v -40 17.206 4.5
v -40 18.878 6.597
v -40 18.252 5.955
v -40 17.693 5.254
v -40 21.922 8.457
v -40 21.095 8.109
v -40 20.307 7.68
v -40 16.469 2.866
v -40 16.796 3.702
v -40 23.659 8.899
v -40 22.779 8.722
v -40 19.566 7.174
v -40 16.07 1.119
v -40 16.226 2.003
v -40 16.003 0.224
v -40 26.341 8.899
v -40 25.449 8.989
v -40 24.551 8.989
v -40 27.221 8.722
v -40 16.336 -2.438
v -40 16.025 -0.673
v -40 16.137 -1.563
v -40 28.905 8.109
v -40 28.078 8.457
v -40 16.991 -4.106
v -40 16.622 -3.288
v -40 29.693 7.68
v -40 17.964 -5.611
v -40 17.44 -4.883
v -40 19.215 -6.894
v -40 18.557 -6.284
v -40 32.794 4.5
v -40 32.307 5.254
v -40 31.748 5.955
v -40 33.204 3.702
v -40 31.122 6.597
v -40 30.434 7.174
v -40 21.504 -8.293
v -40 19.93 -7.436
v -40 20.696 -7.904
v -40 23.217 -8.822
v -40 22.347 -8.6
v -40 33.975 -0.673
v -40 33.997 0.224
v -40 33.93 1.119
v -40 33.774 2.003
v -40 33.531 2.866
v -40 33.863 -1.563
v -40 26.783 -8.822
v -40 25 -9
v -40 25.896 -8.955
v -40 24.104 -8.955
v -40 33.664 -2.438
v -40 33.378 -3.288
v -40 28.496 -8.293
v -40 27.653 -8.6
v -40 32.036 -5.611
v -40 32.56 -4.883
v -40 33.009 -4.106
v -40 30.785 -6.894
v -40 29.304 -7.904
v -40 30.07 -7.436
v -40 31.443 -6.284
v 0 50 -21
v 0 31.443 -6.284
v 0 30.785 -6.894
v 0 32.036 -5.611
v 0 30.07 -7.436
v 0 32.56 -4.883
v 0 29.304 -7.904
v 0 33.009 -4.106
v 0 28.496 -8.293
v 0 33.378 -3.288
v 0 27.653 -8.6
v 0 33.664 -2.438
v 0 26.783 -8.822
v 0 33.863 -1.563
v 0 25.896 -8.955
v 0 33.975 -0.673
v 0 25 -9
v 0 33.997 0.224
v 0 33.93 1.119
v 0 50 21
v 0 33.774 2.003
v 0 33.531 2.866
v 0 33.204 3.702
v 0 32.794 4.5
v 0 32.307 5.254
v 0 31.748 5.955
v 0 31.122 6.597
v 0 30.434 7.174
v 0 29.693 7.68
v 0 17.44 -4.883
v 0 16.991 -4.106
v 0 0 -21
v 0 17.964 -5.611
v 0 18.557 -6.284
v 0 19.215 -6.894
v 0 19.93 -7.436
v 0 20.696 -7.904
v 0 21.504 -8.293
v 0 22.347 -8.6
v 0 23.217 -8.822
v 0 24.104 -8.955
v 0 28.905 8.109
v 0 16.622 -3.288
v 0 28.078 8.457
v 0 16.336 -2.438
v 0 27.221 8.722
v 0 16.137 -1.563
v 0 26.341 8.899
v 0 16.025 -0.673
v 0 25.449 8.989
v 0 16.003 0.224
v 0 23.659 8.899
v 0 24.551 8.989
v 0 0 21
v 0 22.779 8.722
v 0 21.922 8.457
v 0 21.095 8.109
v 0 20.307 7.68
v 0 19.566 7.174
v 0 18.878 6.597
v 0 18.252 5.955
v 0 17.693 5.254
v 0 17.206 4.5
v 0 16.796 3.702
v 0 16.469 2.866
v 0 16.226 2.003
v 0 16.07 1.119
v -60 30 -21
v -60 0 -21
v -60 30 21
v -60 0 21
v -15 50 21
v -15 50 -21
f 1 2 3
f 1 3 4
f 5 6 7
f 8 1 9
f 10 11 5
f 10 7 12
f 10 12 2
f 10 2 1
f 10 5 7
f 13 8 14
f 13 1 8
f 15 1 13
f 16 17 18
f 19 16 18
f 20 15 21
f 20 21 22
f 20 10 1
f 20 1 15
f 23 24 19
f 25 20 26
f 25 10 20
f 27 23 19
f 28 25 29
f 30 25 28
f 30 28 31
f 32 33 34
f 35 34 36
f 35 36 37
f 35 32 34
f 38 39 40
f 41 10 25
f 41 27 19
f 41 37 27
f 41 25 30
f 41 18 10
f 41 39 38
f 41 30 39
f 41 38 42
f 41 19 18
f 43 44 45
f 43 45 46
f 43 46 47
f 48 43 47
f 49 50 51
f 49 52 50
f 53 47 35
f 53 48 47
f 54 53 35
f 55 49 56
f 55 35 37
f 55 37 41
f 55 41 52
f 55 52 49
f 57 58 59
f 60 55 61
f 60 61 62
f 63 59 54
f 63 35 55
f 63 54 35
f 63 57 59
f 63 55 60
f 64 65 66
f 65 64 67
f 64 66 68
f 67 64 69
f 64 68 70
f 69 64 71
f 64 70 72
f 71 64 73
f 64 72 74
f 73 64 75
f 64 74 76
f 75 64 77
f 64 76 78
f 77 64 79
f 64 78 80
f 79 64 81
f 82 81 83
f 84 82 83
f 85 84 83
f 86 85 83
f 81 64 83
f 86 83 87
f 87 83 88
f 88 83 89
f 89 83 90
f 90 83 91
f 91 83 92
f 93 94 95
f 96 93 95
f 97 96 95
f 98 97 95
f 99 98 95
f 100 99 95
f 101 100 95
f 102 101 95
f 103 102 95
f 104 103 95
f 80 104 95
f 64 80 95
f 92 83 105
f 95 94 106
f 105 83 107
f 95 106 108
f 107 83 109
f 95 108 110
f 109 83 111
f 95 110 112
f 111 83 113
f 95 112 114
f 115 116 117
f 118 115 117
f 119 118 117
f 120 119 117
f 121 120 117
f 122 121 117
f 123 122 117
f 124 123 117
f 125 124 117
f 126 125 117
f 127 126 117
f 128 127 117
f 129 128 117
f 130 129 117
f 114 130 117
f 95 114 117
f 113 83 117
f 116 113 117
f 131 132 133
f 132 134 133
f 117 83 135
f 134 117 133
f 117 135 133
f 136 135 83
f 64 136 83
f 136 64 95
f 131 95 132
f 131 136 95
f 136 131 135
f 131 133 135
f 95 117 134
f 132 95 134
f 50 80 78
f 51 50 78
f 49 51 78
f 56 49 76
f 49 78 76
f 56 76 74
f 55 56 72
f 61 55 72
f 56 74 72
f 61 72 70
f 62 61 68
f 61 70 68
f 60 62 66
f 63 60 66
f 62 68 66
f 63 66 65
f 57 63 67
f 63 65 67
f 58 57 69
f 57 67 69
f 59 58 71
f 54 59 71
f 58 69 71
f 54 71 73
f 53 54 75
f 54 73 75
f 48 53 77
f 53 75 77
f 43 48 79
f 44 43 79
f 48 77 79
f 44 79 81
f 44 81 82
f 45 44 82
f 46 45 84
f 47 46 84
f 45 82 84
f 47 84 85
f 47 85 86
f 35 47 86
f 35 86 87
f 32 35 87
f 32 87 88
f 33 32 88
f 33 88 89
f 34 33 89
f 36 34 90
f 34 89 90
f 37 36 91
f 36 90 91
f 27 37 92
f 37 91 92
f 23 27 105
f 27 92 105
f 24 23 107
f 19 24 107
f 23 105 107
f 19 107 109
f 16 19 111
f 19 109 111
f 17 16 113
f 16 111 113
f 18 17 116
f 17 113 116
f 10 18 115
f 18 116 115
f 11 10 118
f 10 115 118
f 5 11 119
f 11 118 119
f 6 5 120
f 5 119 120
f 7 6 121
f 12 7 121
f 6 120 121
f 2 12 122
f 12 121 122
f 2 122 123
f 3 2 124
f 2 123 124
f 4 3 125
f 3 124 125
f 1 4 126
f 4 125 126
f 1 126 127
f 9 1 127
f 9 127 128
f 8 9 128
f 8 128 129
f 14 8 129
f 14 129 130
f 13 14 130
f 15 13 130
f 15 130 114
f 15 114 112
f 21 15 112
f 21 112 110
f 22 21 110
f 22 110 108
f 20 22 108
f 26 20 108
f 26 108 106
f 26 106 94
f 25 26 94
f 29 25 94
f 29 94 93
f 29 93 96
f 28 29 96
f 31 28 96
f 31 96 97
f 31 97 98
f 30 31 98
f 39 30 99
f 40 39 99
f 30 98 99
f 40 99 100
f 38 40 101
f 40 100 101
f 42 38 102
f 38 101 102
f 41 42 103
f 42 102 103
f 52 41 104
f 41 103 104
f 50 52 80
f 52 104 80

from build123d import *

# Parameters (mm, degrees)
BOSS_EXTRUDE1_DEPTH = 21
SKETCH2_R           = 9
CUT_EXTRUDE1_DEPTH  = 40


with BuildPart() as part:
    # Sketch1 → Boss-Extrude1 (new body, symmetric)
    with BuildSketch(Plane.XY):
        Polygon((0, 0), (-60, 0), (-60, 30), (-15, 50), (0, 50), align=None)
    extrude(amount=BOSS_EXTRUDE1_DEPTH, both=True)

    # Sketch2 → Cut-Extrude1 (cut)
    with BuildSketch(Plane(origin=(0, 0, 0), x_dir=(0, 0, -1), z_dir=(1, 0, 0))):
        with Locations((0, 25)):
            Circle(SKETCH2_R)
    extrude(amount=-CUT_EXTRUDE1_DEPTH, mode=Mode.SUBTRACT)


solid = part.part
